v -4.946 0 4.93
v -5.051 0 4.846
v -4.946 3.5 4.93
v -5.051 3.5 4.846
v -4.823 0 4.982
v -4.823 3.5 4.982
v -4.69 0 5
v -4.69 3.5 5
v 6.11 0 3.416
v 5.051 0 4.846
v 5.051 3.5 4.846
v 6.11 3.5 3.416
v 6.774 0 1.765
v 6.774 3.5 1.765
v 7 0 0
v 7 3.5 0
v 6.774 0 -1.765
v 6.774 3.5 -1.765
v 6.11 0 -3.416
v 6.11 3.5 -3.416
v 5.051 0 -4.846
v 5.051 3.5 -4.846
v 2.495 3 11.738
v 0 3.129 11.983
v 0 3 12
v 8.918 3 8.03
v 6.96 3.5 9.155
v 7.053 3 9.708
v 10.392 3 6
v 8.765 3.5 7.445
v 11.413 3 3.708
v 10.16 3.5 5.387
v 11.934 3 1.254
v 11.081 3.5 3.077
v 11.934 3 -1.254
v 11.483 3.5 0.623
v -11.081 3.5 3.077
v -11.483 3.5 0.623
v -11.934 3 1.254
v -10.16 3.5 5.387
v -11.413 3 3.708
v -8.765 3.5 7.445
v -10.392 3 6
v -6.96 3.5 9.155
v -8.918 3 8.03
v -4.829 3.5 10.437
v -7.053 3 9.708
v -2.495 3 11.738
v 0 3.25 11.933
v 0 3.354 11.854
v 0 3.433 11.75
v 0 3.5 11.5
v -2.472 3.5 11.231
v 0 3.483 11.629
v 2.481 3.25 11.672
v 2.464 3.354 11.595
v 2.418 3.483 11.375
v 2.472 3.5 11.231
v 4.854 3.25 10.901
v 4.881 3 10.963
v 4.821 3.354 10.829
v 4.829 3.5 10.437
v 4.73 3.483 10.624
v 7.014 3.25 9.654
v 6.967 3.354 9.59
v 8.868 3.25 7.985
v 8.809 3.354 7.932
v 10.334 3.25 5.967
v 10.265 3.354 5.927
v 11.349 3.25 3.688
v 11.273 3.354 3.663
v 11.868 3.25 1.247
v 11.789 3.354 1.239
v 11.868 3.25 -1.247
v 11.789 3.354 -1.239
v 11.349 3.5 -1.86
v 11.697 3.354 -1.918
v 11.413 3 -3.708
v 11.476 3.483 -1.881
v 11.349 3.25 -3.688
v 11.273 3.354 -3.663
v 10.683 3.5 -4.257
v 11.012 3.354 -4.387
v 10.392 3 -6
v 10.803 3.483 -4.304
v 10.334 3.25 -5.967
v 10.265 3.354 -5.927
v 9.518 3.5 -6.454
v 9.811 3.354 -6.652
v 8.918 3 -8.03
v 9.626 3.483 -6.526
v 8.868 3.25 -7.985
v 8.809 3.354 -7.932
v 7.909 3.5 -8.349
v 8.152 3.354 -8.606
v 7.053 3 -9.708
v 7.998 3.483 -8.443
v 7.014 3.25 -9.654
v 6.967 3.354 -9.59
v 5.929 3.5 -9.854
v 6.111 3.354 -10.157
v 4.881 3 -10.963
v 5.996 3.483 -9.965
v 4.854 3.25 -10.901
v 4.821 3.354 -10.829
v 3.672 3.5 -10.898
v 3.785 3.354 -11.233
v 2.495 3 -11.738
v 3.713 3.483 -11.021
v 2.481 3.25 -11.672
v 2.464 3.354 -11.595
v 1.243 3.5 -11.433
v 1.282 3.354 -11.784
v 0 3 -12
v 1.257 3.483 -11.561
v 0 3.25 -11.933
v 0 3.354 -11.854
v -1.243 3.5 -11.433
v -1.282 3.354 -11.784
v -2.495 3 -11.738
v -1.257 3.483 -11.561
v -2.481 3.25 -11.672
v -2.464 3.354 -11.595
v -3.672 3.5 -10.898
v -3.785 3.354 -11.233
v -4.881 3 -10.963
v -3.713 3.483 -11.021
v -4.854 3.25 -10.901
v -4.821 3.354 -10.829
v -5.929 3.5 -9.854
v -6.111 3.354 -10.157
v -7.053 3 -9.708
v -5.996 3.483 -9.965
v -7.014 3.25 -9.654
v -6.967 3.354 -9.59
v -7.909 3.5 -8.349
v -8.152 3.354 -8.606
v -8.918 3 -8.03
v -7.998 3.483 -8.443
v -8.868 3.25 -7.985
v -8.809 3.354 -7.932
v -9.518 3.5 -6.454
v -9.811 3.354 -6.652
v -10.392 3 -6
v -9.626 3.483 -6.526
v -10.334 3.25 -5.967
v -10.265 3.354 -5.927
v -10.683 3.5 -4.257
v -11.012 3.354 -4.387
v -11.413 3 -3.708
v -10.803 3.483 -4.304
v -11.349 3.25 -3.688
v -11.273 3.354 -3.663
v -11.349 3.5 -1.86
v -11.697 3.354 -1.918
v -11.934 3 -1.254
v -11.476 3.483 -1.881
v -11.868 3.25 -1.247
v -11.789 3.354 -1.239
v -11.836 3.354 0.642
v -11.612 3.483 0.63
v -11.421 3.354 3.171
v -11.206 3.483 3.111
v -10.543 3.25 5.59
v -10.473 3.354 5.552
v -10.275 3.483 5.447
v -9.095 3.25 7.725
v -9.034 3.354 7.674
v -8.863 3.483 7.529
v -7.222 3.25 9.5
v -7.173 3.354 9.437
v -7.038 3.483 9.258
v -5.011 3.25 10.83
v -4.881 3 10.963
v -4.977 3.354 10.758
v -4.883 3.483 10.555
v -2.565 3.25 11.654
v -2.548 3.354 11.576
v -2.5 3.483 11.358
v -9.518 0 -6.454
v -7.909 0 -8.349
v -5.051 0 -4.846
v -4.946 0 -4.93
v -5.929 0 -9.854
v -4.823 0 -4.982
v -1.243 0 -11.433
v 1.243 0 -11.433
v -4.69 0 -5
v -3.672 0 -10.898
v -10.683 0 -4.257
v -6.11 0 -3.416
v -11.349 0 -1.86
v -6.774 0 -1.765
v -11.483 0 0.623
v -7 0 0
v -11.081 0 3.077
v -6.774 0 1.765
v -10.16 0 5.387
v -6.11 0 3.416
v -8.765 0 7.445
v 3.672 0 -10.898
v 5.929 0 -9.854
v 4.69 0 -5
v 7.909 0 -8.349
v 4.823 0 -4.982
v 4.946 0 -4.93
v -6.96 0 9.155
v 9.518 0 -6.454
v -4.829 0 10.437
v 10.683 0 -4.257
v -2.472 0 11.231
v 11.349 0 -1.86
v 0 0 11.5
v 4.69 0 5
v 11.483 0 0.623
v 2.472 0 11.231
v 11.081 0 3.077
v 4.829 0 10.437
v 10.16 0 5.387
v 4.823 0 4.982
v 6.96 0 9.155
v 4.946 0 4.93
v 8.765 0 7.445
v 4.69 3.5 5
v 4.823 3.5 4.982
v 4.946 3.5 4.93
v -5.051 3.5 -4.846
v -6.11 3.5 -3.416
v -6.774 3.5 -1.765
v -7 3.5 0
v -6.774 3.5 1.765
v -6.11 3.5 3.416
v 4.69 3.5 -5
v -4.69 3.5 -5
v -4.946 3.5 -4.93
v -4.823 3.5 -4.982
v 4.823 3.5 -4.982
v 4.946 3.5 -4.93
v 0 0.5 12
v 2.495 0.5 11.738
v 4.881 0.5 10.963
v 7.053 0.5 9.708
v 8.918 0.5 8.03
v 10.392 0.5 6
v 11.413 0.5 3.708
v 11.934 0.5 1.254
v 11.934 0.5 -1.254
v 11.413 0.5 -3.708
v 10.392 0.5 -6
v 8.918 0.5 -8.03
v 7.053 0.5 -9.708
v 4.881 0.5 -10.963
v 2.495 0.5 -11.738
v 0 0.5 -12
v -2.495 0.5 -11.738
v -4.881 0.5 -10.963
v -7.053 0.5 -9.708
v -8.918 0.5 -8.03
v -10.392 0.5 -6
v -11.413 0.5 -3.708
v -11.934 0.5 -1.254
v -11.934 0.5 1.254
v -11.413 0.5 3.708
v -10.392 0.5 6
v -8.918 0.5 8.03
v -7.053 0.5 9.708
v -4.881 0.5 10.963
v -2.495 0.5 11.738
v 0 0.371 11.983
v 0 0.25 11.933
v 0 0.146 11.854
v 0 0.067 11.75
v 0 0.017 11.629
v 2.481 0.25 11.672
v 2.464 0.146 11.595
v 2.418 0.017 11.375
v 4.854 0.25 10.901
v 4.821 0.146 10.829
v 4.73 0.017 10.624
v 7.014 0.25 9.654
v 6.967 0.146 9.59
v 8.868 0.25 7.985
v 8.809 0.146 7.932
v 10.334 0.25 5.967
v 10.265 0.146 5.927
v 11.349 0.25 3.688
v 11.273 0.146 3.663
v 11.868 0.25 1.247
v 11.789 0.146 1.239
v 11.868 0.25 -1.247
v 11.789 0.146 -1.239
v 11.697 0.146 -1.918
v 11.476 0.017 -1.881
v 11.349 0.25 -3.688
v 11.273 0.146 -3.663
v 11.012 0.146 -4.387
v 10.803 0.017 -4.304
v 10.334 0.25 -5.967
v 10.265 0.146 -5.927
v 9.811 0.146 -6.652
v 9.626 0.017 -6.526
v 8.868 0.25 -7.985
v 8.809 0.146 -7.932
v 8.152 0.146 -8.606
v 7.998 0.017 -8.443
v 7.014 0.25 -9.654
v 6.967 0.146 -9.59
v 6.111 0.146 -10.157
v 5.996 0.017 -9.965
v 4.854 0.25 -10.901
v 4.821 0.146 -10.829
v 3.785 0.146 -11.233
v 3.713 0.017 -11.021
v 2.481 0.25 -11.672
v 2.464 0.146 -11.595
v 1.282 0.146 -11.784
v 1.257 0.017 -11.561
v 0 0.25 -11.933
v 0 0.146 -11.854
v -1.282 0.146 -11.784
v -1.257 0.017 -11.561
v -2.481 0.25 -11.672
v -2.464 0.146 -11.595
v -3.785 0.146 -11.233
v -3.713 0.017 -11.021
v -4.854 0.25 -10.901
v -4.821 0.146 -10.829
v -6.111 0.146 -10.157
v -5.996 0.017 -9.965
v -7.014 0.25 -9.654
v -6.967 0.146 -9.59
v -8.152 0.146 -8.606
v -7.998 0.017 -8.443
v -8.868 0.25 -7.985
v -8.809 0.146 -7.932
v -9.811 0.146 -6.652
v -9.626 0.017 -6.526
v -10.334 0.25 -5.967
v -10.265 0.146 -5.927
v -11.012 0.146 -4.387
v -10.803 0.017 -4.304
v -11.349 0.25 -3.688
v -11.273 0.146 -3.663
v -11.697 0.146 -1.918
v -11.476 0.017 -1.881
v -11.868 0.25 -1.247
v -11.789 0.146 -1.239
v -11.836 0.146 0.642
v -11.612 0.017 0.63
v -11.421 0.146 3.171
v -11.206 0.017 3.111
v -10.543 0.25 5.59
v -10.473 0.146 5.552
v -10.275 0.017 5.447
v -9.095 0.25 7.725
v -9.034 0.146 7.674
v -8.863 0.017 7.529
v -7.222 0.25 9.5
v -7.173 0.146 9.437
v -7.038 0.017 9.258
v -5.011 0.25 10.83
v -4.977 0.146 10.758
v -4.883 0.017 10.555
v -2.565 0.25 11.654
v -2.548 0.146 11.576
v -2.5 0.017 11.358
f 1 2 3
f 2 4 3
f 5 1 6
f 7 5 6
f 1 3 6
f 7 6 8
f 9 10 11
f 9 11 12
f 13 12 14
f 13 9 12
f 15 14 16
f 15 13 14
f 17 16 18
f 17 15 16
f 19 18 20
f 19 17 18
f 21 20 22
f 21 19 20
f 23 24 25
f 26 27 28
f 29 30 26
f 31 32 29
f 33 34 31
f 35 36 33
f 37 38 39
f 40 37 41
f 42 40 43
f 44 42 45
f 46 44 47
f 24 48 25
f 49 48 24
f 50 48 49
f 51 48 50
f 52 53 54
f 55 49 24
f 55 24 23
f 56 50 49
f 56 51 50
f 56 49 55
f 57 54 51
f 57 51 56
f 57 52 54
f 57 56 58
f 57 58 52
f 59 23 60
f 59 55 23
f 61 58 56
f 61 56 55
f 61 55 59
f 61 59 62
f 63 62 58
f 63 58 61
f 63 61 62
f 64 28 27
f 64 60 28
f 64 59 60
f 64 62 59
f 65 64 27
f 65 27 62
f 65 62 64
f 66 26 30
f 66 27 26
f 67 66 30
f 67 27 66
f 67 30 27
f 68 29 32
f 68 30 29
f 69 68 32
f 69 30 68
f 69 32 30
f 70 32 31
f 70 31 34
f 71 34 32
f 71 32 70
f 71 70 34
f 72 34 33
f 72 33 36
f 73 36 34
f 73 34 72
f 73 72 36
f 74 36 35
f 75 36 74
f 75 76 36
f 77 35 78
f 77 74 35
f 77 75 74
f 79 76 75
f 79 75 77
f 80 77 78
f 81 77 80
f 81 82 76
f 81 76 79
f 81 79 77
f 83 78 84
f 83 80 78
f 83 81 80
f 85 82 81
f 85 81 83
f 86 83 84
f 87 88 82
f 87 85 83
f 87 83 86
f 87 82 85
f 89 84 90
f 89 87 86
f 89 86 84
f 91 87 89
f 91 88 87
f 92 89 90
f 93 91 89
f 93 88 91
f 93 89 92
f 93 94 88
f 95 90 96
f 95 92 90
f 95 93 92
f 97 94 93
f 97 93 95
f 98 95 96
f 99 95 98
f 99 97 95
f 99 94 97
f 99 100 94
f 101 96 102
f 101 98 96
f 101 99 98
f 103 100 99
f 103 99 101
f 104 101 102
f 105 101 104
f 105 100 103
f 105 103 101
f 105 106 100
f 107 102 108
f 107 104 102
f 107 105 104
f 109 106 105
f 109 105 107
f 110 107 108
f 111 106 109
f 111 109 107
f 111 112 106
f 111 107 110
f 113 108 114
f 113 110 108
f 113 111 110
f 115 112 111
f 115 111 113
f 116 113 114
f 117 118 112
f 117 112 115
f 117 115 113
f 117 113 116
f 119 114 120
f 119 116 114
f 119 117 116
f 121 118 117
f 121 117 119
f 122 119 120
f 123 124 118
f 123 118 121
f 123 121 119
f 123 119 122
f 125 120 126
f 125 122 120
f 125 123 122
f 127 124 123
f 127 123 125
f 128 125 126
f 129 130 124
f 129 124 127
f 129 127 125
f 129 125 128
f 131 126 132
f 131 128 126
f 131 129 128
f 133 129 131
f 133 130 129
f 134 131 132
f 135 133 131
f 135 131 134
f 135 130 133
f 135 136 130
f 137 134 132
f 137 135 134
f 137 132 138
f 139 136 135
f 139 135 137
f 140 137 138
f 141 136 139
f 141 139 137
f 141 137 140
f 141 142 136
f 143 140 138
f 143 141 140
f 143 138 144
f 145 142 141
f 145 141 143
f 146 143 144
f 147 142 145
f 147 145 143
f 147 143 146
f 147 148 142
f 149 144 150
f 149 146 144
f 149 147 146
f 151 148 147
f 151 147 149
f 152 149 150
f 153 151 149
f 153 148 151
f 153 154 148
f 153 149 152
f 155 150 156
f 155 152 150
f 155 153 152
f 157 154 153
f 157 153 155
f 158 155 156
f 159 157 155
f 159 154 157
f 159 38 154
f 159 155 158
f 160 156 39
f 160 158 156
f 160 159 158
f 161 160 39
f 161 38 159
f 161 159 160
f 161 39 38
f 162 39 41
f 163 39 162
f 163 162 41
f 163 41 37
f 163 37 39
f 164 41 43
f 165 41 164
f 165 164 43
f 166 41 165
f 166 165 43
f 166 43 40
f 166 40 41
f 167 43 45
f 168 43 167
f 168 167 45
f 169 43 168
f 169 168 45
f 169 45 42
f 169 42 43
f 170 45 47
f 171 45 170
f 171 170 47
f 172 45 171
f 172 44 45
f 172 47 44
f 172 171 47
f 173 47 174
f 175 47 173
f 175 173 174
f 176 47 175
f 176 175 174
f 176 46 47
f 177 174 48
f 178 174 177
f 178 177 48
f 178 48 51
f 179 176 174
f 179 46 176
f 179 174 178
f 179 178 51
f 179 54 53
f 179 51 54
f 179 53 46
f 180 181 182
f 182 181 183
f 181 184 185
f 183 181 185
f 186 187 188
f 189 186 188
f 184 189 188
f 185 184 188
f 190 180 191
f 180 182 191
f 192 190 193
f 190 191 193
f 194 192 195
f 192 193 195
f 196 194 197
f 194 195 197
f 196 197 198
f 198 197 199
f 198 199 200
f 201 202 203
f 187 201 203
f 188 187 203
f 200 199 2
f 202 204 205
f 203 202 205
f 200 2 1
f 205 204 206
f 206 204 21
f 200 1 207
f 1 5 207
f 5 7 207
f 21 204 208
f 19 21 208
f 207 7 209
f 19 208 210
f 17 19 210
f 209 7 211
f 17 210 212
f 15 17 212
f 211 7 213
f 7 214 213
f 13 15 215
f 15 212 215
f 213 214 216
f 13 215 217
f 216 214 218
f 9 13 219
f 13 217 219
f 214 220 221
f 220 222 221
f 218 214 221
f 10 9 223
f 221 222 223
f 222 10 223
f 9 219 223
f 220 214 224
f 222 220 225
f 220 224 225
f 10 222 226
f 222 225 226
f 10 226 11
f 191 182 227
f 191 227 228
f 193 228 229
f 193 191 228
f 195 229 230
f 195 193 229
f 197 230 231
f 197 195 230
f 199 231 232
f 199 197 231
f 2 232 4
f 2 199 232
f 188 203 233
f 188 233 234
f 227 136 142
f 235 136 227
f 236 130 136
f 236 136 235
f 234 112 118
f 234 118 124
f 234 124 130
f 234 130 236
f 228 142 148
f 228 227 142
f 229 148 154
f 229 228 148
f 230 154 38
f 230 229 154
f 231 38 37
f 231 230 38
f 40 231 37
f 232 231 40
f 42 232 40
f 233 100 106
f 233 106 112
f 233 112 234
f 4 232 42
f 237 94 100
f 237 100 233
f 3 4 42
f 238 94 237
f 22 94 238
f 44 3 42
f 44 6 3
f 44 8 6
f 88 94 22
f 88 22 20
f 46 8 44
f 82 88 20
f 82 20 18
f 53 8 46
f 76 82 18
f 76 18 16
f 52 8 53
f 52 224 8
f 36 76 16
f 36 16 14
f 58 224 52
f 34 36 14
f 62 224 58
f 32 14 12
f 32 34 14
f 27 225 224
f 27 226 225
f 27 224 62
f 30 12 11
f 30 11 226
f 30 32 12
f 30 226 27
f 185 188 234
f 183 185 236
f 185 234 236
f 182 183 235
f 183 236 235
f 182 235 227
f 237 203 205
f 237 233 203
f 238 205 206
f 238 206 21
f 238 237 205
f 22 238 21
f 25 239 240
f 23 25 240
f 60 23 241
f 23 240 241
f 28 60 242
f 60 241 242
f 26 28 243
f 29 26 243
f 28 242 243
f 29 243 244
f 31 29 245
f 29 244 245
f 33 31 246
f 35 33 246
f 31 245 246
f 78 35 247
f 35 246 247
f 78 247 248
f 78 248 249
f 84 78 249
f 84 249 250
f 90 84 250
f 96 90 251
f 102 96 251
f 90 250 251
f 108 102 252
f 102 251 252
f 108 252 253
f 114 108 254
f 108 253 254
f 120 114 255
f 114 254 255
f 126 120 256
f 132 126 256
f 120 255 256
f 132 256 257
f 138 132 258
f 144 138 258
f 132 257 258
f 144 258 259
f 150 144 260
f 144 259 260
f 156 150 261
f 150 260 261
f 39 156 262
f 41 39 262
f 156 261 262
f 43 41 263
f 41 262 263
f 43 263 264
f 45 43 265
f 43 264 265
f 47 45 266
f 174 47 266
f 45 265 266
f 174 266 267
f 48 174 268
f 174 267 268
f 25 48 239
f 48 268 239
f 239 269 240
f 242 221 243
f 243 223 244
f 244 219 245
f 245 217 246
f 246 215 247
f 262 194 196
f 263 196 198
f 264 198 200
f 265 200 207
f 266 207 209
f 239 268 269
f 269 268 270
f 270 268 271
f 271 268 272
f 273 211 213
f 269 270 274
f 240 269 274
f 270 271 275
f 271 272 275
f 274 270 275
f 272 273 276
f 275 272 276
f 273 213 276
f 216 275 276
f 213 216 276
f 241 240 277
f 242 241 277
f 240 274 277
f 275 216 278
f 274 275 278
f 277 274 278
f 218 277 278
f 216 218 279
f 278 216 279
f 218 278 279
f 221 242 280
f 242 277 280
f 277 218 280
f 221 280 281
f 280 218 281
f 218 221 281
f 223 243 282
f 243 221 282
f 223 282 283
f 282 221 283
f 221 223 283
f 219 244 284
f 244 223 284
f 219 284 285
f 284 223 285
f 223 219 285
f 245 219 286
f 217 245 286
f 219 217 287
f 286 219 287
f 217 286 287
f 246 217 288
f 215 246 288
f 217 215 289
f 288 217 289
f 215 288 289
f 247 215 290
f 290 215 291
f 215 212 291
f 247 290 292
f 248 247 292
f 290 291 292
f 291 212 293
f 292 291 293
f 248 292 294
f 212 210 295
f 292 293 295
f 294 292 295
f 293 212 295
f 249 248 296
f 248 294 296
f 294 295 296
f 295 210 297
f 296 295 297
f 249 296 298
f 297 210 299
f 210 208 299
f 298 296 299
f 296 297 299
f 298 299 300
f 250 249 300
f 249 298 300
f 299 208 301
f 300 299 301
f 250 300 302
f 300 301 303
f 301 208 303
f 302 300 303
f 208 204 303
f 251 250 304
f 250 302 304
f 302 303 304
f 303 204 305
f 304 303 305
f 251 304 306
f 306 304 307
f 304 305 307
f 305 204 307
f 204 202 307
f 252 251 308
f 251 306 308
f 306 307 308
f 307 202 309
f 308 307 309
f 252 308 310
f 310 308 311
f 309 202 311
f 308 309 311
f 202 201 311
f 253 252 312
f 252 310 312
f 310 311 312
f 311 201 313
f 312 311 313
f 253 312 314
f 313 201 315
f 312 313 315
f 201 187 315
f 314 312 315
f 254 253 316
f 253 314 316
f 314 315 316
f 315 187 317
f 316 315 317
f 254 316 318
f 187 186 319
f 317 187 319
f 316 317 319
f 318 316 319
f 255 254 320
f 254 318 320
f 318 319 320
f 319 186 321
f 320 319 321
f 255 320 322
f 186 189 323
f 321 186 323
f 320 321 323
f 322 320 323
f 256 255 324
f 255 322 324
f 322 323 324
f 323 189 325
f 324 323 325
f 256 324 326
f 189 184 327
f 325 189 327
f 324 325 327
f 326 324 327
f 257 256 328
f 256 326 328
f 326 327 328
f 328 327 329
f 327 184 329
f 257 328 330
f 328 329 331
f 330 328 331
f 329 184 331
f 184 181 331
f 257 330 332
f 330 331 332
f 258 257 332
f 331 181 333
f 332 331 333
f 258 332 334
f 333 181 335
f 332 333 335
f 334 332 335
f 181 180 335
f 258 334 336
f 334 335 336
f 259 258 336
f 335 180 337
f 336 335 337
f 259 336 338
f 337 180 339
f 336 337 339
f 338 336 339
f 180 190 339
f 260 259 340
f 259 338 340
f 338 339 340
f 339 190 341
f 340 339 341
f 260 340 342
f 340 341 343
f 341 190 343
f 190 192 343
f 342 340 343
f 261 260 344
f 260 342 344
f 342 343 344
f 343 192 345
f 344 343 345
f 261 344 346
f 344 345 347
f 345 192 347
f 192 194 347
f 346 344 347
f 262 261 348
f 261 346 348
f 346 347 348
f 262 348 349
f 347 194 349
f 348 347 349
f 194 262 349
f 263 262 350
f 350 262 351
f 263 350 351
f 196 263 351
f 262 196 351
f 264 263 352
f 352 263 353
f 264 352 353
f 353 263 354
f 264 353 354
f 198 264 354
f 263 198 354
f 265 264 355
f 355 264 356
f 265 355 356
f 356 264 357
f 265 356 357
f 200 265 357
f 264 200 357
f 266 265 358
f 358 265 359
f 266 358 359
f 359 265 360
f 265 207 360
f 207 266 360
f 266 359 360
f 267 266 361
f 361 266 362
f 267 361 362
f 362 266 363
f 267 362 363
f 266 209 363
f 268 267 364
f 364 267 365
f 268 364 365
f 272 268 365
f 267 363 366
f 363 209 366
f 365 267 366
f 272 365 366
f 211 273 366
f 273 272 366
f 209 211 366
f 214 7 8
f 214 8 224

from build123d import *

# Parameters (mm, degrees)
SKETCH_1_R          = 12
EXTRUDE_1_DEPTH     = 3.5
CUT_EXTRUDE_1_DEPTH = 18.327723451
FILLET_1_R          = 0.5


with BuildPart() as part:
    # 草图1 → 凸台-拉伸1 (new body)
    with BuildSketch(Plane(origin=(0, 0, 0), x_dir=(1, 0, 0), z_dir=(0, 1, 0))):
        with Locations(Location((0, 0, 0), (0, 0, 270))):
            Circle(SKETCH_1_R)
    extrude(amount=EXTRUDE_1_DEPTH)

    # 草图2 → 切除-拉伸1 (cut, through all)
    with BuildSketch(Plane.XZ):
        with BuildLine():
            Line((4.898979486, -5), (-4.898979486, -5))
            ThreePointArc((-4.898979486, -5), (-7, 0), (-4.898979486, 5))
            Line((-4.898979486, 5), (4.898979486, 5))
            ThreePointArc((4.898979486, 5), (7, 0), (4.898979486, -5))
        make_face()
    extrude(amount=-CUT_EXTRUDE_1_DEPTH, mode=Mode.SUBTRACT)

    # 圆角1
    fillet_1_edges = [part.edges().sort_by_distance(p)[0] for p in [
        (4.898979486, 1.75, -5),
        (-4.898979486, 1.75, -5),
        (-4.898979486, 1.75, 5),
        (0, 0, -12),
        (0, 3.5, -12),
        (4.898979486, 1.75, 5),
    ]]
    fillet(fillet_1_edges, radius=FILLET_1_R)


solid = part.part
